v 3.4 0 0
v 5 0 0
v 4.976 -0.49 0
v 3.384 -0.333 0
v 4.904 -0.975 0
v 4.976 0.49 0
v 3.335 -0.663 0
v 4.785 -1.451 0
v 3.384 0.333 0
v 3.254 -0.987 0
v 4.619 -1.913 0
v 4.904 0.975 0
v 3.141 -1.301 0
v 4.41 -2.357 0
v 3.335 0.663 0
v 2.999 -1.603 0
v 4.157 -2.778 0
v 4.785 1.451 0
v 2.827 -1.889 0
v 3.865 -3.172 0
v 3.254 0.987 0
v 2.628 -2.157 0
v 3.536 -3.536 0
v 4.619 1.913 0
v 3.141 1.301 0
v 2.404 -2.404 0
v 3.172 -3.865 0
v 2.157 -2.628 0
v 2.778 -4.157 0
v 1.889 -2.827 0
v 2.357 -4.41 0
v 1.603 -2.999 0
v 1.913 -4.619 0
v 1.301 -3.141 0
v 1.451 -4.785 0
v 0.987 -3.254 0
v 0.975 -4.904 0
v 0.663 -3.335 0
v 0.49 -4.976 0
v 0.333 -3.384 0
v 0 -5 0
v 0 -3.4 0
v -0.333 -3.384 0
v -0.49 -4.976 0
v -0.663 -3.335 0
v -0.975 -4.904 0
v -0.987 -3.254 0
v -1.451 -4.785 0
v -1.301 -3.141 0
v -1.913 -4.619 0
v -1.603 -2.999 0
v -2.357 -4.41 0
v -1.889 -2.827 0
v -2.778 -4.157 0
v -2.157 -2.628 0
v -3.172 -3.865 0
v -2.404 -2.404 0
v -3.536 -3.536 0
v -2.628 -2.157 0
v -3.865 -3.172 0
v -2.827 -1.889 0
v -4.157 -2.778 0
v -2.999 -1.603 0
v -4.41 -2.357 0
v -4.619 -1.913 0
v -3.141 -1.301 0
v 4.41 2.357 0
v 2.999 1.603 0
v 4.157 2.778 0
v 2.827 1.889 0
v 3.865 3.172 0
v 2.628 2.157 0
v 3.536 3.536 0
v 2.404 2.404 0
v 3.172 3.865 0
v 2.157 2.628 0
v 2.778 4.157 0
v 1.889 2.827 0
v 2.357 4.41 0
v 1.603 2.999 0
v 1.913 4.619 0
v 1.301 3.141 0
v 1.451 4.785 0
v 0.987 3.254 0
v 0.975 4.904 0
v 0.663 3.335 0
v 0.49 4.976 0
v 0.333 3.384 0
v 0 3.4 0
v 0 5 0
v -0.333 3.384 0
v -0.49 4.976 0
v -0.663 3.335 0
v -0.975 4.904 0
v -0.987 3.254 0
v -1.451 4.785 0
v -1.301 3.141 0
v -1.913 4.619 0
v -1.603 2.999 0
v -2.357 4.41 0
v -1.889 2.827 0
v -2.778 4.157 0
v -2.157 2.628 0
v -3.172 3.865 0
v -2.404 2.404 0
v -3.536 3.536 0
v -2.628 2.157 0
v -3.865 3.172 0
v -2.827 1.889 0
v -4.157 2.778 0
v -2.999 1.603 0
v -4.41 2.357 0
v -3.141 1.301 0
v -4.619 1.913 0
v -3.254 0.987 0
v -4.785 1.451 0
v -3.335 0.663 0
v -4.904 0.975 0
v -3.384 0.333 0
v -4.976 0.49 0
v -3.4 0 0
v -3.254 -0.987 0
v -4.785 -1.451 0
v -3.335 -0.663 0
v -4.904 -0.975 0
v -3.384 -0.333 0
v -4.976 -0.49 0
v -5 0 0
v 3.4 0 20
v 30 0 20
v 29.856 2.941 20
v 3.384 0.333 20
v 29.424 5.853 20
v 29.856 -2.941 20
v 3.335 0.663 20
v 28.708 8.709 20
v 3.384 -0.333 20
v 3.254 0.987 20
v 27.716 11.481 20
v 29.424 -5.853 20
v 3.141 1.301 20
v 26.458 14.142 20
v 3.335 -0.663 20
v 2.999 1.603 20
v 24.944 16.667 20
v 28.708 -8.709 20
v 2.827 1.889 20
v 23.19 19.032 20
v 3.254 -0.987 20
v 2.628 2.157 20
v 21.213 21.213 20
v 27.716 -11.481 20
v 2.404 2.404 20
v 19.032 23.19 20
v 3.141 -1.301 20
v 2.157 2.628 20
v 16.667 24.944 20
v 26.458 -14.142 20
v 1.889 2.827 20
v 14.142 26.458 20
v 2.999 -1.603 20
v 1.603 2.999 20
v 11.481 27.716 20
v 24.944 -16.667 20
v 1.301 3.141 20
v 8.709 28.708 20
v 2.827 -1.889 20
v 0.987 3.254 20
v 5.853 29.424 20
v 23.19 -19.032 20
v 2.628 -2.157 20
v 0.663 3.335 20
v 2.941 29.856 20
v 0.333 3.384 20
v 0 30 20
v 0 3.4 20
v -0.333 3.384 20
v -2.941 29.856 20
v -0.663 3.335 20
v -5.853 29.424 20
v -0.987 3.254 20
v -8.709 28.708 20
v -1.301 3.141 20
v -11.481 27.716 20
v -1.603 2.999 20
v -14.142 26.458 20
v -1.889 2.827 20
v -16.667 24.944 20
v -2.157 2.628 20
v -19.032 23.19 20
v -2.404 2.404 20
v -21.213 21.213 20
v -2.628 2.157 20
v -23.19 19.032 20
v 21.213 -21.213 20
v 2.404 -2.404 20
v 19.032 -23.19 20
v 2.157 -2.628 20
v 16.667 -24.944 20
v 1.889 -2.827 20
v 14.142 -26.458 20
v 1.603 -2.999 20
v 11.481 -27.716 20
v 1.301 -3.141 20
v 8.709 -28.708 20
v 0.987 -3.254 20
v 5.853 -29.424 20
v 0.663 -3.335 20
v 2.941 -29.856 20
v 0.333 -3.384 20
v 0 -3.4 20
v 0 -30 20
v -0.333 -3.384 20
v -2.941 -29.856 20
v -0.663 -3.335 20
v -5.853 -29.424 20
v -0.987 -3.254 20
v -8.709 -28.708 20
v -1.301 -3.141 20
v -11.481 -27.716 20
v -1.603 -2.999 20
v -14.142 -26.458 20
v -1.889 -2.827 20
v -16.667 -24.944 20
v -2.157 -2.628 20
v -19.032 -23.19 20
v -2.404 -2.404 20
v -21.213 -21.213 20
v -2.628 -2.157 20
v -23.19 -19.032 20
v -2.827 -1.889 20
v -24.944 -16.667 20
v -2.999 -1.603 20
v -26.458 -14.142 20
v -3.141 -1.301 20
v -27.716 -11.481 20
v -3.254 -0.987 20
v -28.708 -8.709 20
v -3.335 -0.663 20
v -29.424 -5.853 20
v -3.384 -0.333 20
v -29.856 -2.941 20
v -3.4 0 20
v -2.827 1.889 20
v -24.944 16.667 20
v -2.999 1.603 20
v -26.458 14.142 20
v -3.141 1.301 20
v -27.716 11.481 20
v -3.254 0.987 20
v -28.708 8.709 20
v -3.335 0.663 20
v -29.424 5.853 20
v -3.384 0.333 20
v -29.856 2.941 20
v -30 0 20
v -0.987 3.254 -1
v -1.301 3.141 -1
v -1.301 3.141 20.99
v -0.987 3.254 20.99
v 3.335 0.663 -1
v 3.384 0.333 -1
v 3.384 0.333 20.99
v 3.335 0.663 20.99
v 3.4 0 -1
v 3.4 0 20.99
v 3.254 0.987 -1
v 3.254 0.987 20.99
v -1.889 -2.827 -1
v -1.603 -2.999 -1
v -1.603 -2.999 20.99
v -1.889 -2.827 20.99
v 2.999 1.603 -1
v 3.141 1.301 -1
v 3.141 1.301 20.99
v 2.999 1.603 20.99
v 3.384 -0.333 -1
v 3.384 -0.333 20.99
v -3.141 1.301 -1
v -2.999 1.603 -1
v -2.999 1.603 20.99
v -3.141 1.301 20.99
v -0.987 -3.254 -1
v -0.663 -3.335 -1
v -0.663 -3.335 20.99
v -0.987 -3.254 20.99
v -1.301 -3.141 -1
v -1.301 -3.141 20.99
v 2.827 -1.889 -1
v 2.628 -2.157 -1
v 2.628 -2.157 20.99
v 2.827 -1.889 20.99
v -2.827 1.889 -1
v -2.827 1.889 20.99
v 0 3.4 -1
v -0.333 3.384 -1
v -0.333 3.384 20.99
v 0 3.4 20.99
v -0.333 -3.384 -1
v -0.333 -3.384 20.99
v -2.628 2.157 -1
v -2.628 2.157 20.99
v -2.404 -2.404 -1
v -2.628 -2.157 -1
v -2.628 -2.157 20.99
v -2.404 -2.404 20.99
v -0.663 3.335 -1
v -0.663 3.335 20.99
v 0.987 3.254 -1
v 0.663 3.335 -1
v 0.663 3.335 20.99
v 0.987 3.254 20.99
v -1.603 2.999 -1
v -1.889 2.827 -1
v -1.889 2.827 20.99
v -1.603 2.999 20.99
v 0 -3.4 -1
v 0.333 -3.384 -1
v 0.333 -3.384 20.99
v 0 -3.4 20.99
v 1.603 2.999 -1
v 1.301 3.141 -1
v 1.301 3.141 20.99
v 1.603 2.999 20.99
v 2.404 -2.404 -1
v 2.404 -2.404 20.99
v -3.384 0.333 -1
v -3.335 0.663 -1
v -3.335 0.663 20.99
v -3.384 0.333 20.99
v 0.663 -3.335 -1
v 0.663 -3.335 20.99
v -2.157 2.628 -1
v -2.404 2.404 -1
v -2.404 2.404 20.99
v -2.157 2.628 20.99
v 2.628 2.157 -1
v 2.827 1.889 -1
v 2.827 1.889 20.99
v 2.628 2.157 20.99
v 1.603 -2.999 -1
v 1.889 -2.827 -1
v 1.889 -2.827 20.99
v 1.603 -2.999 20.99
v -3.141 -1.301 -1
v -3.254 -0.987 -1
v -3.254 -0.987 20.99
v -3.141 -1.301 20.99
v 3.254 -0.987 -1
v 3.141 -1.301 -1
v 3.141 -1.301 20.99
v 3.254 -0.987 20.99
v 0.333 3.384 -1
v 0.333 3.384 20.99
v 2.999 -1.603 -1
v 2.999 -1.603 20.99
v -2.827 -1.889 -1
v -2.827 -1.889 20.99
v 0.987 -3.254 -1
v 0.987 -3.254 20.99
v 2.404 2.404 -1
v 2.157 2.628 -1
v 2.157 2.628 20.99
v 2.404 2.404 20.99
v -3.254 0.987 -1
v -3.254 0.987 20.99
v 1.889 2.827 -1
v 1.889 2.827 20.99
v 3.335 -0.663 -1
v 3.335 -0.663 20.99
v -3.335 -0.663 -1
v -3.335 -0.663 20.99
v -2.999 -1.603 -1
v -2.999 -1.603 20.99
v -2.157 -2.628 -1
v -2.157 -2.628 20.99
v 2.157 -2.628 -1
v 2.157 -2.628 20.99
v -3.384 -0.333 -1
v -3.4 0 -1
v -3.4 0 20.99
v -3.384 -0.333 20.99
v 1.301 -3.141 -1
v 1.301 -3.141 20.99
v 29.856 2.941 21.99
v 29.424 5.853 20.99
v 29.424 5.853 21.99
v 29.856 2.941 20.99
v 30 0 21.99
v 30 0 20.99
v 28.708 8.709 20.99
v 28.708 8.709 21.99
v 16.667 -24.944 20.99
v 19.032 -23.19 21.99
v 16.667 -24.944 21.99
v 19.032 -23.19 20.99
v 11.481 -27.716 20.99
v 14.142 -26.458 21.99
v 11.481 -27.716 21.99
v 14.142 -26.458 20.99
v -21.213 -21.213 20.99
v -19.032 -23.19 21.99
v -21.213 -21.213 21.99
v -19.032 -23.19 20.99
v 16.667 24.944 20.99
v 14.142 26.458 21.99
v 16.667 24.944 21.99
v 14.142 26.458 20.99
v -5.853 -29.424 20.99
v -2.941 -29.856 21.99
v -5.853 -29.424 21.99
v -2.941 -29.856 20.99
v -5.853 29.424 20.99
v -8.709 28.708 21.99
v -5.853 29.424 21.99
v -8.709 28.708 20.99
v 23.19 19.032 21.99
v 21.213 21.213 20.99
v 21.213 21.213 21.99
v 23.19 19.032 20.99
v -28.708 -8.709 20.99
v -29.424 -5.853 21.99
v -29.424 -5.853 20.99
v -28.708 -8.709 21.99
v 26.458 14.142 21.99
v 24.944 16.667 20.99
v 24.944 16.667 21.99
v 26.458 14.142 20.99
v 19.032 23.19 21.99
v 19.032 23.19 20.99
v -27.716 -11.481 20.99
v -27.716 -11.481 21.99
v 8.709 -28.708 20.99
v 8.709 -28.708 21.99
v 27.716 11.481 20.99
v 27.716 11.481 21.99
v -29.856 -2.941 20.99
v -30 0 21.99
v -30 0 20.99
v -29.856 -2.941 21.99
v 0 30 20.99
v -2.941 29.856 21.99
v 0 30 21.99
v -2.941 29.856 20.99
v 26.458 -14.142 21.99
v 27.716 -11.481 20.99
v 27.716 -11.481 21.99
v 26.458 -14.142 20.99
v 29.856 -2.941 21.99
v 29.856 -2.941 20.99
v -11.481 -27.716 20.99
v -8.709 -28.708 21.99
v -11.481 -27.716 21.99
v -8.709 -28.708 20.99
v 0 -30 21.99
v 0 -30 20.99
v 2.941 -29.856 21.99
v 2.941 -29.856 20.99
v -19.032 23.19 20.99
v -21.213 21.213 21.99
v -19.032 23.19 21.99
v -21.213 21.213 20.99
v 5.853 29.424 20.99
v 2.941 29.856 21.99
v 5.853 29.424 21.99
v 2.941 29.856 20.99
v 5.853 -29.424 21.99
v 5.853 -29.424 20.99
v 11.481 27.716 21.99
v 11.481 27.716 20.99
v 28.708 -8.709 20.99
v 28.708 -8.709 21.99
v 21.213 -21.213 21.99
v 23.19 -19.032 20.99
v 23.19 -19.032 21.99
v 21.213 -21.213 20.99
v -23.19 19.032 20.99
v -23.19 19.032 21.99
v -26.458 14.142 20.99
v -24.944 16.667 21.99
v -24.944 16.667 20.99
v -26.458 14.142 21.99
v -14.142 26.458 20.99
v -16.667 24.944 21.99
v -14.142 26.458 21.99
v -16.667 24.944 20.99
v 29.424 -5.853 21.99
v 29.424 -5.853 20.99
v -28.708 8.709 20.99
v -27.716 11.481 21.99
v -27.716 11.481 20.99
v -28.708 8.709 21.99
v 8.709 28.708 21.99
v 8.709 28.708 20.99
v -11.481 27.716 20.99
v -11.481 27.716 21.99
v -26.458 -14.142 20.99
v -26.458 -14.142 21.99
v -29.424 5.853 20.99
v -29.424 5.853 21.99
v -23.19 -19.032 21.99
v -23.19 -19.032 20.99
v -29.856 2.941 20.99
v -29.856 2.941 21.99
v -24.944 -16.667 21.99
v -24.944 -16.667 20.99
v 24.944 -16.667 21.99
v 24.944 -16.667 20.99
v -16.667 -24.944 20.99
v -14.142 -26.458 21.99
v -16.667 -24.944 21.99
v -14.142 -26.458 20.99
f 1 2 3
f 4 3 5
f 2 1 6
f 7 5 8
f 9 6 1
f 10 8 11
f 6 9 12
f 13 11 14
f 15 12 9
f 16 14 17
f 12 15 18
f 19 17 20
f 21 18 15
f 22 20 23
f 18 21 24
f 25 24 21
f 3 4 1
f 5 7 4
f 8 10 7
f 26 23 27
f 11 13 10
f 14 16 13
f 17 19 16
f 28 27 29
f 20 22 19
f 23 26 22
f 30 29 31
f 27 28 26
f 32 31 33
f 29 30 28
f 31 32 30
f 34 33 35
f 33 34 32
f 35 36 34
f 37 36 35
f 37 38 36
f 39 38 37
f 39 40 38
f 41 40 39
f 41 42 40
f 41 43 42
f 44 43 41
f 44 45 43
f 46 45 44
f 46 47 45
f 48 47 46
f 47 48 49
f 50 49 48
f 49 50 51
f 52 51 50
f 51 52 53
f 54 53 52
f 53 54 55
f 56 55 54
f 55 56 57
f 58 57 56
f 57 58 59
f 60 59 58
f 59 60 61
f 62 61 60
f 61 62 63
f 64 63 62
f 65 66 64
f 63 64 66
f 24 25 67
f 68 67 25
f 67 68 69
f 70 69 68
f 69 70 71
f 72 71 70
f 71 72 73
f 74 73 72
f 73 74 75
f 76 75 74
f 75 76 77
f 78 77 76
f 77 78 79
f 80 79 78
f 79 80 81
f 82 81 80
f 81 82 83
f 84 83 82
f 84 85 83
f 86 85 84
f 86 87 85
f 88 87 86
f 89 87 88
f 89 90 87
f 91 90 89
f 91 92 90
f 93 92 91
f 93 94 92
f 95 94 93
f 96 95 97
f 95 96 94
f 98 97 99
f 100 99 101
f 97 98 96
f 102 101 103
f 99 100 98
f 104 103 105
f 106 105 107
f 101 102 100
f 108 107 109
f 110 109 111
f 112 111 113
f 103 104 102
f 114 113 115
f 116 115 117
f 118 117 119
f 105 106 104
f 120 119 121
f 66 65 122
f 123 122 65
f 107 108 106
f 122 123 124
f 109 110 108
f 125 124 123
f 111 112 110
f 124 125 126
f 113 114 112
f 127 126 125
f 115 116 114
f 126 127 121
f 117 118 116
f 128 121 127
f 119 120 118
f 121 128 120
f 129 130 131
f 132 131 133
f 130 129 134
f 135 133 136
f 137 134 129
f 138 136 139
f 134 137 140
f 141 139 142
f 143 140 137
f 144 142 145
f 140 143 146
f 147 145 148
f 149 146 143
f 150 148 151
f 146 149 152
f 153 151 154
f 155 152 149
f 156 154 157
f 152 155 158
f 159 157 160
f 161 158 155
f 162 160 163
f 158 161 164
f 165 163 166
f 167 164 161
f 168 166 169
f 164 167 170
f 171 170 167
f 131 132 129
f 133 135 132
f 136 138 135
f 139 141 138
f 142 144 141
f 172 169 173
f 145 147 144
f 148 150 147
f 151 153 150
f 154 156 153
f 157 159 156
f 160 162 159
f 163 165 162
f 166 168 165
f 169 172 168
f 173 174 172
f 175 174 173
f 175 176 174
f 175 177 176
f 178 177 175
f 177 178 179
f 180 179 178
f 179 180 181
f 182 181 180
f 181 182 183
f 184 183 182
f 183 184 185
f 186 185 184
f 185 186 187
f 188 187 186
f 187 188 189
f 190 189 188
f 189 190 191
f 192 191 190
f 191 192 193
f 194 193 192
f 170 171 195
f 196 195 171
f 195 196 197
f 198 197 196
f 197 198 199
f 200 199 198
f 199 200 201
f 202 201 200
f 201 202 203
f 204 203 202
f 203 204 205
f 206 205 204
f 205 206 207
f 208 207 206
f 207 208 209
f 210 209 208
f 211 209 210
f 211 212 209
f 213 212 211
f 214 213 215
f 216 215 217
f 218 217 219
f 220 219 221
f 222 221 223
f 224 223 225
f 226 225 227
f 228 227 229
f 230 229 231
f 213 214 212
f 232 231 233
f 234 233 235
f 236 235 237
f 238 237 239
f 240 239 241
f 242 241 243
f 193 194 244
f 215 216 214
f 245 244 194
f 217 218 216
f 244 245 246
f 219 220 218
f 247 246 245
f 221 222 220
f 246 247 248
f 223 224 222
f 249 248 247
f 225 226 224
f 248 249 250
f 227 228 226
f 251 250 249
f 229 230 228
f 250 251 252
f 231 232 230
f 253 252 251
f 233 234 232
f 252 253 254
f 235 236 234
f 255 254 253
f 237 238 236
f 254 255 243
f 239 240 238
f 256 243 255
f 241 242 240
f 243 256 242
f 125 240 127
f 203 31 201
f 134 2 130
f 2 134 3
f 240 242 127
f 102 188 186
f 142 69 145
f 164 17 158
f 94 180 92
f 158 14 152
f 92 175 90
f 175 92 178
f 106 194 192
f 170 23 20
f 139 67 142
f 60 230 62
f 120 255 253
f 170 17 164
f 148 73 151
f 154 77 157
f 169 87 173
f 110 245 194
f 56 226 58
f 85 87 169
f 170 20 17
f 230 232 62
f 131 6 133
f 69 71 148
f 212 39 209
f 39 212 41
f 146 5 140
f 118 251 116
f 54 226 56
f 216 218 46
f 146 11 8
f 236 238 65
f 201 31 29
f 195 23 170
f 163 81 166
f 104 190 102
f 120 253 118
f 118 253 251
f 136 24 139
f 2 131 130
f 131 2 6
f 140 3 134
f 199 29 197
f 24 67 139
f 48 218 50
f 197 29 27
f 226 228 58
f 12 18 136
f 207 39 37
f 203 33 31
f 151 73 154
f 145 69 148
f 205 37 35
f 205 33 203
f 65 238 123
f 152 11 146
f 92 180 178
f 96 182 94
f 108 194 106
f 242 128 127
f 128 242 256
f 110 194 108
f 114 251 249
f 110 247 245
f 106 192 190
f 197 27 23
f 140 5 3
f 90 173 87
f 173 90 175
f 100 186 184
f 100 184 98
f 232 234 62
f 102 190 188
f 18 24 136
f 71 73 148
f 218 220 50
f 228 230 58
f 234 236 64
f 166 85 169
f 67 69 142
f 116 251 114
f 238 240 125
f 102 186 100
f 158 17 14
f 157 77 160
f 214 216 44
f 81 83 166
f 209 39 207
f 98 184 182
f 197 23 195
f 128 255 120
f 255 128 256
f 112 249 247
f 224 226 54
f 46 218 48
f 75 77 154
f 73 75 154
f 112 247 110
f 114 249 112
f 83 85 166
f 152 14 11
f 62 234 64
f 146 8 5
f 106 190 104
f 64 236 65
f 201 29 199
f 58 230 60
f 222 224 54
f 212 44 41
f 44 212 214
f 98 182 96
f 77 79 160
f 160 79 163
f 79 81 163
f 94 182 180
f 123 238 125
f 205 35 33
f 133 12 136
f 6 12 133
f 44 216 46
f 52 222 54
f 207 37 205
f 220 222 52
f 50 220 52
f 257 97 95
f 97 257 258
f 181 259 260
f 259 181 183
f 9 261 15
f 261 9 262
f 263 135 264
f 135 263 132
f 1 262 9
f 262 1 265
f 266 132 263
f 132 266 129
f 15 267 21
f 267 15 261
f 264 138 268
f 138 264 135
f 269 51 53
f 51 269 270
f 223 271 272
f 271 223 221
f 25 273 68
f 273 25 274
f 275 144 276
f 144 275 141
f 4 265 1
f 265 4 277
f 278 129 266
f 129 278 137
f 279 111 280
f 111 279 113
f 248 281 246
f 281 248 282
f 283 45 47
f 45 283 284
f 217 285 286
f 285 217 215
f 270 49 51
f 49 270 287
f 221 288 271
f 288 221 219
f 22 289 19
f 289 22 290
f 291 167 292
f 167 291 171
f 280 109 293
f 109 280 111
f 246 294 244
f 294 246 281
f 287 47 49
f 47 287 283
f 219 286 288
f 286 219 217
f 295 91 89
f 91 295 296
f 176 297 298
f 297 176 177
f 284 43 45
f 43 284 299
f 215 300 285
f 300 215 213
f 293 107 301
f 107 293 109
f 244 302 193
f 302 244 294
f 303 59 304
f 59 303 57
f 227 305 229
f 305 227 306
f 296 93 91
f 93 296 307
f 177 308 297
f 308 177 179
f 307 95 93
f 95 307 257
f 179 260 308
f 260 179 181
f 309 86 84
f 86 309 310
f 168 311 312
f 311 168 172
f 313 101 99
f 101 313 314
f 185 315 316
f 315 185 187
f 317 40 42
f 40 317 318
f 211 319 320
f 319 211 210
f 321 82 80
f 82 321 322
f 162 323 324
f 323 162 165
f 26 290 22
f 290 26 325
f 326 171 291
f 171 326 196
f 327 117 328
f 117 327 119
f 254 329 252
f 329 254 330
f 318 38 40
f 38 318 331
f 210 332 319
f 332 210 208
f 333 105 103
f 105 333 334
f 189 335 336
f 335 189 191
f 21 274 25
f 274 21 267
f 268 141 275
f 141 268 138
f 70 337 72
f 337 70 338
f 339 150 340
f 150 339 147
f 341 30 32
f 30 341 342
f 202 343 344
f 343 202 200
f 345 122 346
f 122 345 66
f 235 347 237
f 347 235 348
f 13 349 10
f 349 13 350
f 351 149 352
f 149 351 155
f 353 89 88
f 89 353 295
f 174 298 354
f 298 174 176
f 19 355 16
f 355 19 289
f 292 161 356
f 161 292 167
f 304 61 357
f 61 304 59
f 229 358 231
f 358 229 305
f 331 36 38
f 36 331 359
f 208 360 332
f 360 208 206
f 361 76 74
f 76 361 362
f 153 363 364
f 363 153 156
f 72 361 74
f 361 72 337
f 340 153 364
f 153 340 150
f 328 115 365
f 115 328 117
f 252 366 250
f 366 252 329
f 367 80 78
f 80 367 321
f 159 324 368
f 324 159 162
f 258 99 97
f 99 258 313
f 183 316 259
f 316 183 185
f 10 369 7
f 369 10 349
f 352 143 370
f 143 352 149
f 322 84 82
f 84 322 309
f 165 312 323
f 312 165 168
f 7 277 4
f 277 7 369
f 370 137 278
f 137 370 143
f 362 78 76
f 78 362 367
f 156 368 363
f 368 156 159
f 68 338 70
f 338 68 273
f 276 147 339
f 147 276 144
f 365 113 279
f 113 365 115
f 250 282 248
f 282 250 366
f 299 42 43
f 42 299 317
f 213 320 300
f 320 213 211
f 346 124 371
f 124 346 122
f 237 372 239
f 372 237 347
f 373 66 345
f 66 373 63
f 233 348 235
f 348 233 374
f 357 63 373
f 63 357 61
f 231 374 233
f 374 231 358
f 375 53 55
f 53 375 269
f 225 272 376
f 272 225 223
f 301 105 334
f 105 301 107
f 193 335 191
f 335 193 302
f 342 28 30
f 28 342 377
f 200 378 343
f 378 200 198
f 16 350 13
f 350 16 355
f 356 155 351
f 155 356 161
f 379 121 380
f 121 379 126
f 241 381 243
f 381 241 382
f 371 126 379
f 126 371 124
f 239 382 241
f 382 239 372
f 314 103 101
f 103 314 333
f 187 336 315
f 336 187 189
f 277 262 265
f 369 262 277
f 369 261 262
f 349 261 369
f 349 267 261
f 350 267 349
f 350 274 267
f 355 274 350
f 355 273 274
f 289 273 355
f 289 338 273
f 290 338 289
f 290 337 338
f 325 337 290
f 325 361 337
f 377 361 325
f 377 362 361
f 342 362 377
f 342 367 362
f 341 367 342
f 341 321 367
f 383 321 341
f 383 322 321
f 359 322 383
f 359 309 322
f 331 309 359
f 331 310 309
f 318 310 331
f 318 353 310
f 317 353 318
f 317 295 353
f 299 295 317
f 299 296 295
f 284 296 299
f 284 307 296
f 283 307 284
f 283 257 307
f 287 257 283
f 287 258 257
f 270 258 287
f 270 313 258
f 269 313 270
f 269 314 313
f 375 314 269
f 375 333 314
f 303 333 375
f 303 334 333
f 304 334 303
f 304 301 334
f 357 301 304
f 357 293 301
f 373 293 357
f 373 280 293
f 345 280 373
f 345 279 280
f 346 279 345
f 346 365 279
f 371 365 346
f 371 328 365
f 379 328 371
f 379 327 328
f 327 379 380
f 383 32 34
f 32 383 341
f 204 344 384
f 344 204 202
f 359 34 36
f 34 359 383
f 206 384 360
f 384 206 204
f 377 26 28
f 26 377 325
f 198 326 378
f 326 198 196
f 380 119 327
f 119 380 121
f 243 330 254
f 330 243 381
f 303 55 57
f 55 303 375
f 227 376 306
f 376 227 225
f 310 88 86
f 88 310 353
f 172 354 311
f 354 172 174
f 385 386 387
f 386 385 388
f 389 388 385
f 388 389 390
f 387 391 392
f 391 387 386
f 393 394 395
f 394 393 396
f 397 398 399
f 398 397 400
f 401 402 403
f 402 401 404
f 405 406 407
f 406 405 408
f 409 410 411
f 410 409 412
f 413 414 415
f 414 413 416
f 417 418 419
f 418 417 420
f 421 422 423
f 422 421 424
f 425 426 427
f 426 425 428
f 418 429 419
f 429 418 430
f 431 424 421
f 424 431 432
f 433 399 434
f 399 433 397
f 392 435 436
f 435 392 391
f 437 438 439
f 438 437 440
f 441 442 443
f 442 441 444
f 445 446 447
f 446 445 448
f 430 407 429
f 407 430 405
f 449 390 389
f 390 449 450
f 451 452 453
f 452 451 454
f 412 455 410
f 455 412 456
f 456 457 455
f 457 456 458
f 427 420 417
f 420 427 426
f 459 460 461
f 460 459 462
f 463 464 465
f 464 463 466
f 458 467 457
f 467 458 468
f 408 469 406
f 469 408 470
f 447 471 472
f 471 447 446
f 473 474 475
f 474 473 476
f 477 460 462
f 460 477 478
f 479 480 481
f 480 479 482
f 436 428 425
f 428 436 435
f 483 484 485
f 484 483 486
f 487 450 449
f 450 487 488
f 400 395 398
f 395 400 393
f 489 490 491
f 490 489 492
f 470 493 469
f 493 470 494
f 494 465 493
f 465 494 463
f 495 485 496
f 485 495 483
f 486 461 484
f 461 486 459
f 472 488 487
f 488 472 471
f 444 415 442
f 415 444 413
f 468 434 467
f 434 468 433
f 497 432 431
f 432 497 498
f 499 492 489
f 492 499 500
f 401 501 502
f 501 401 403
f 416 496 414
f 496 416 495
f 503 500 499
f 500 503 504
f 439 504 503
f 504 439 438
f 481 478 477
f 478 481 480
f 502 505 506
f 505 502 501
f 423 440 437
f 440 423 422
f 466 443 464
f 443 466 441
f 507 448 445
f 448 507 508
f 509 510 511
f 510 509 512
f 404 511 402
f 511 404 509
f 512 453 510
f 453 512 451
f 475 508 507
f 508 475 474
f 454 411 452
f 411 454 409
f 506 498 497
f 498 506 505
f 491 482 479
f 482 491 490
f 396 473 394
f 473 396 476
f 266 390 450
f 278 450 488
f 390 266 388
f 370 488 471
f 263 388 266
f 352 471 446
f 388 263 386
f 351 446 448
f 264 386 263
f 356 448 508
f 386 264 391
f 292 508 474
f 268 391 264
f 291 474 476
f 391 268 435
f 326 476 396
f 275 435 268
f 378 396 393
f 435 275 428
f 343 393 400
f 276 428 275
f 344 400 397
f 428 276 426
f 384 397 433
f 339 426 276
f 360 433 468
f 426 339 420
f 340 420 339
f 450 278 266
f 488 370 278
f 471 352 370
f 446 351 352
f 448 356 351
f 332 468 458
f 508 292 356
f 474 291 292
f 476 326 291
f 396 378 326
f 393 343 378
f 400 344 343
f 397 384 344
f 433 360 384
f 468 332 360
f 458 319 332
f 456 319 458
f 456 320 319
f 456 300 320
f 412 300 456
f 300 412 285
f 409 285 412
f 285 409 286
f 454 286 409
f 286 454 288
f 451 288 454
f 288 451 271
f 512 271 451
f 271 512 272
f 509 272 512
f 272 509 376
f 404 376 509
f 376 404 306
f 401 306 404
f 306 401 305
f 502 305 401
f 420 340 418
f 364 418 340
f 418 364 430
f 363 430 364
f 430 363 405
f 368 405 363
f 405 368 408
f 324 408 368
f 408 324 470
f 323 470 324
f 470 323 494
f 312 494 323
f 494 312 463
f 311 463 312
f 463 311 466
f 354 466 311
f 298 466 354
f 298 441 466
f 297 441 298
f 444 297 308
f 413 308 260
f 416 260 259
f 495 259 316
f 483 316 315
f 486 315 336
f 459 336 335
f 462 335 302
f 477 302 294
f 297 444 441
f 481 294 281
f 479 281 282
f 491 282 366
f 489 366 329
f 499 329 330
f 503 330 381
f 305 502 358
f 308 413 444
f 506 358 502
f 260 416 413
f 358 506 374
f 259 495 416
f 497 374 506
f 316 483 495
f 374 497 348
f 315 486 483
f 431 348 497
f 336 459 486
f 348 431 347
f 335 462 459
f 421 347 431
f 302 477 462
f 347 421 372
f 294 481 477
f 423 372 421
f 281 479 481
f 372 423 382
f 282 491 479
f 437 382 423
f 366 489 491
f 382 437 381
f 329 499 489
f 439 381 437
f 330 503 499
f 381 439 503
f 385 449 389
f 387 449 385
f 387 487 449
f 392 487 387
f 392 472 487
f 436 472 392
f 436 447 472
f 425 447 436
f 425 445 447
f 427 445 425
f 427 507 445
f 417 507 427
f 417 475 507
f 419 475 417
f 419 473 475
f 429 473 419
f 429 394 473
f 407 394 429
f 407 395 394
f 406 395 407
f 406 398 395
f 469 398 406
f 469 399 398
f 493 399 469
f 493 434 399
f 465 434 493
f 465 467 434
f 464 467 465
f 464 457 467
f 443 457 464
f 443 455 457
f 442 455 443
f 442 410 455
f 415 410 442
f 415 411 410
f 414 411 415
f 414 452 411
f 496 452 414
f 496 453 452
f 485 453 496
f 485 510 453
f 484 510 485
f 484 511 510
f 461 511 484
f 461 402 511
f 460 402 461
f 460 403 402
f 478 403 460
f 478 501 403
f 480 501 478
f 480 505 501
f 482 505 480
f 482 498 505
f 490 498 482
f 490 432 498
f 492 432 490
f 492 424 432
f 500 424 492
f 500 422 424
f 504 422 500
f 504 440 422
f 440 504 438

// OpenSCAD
// Funnel - a spout (tube) sitting on top of a conical funnel, open at both ends. NOVEL part.
//

spout_d  = 10;
spout_l  = 20;
funnel_d = 60;
wall     = 1.6;

$fn = 64;

inner = spout_d - 2 * wall;

union() {
    cylinder(h = spout_l, d = spout_d);                 // spout (tube)
    cylinder(h = spout_l, d = spout_d, d2 = funnel_d);  // cone sitting on the spout
    translate([0, 0, -1]) cylinder(h = spout_l + 2, d = inner);      // through-bore
    translate([0, 0, spout_l + 0.99]) cylinder(h = 1, d = funnel_d); // open the cone end
}
